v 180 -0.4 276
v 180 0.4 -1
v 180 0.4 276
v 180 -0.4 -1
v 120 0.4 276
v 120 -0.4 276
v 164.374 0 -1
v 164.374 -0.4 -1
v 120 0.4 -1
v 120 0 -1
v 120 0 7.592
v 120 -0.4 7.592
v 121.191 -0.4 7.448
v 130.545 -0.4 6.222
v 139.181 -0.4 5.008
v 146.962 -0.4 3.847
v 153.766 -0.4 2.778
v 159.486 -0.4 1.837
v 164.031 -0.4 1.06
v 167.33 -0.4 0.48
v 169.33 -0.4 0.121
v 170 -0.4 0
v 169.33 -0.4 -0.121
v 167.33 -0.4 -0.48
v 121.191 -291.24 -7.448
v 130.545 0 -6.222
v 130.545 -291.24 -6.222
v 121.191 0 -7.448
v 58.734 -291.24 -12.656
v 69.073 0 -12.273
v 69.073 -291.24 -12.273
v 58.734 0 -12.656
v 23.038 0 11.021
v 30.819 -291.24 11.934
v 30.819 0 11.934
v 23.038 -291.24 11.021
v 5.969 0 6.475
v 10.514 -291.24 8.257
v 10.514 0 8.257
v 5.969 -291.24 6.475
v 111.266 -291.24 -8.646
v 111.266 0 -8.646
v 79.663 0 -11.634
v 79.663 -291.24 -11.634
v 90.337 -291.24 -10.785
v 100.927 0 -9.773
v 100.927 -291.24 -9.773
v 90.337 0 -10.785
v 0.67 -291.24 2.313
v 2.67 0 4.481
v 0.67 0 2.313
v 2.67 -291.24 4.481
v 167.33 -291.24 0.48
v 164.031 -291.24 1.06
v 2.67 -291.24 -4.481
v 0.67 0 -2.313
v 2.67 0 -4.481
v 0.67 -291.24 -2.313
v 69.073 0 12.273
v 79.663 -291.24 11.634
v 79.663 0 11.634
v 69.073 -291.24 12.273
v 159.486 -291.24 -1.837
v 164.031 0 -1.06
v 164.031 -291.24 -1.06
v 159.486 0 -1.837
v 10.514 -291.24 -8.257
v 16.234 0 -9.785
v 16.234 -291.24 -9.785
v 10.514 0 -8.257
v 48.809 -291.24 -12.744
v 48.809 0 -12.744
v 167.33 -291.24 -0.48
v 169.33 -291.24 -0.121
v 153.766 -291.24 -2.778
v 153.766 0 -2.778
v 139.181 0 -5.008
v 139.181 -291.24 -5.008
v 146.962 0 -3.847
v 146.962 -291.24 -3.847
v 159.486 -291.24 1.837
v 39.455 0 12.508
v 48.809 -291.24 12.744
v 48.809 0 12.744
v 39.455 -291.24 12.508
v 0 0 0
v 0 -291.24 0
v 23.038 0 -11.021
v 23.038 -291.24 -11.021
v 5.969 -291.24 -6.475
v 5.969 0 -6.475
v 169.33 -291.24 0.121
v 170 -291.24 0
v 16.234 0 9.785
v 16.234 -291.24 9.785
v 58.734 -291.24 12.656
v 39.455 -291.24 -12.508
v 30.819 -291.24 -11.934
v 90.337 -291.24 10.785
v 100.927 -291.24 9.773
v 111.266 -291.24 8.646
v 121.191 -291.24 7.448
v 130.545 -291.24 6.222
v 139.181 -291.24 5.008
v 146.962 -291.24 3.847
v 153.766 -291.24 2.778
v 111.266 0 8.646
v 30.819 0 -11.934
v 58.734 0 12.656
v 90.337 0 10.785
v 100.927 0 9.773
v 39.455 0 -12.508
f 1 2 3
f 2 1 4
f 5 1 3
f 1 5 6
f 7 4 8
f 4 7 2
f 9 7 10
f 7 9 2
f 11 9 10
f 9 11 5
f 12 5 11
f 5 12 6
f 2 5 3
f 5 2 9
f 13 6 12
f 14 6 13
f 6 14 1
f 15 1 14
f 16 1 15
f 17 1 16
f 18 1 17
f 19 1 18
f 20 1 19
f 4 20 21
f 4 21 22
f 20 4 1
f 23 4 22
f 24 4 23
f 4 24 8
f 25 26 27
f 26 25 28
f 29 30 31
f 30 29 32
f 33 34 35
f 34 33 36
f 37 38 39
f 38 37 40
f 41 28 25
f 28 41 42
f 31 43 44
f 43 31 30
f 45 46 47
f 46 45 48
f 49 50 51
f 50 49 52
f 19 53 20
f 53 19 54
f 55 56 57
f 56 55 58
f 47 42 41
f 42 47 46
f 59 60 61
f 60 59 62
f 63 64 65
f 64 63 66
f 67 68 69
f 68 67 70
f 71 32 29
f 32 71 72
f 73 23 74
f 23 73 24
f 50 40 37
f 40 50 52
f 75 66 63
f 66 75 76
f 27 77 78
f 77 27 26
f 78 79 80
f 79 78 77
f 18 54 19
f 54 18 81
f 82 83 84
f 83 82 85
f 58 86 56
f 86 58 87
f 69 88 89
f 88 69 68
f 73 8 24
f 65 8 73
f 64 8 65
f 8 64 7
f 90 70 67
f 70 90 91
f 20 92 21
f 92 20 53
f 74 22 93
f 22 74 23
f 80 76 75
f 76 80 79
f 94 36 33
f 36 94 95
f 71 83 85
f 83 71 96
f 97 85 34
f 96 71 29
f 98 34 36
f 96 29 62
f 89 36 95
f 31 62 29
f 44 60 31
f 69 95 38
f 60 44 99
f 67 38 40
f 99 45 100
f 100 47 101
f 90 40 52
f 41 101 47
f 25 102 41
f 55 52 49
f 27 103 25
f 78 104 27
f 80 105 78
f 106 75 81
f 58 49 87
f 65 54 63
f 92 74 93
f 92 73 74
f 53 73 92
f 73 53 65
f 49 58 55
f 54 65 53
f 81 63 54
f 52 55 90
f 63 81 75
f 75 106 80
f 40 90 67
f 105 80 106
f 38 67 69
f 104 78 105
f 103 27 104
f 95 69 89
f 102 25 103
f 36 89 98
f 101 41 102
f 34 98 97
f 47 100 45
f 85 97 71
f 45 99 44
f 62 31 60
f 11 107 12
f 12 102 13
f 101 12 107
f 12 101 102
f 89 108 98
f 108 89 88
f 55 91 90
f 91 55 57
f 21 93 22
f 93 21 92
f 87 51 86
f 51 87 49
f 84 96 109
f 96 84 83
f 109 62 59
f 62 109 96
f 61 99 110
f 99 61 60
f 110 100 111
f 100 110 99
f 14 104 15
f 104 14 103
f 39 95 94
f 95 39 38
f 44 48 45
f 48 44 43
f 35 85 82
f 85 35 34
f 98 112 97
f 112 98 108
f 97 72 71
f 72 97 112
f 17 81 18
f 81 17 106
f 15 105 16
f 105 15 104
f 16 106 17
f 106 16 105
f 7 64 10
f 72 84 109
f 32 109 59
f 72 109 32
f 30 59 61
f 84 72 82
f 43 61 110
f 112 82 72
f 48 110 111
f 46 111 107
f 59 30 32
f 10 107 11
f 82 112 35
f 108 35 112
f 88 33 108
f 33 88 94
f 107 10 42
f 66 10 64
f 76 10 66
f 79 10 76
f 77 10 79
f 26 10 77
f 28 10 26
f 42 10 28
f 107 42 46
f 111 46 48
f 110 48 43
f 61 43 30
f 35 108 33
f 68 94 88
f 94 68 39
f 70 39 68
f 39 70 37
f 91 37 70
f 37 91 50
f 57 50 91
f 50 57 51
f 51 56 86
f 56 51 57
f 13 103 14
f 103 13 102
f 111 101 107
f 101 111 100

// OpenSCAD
// file: 888_1000.scad
/*
// Nastavení zobrazení
$vpr = [338, 0, 357];
$vpt = [180, 25, -18];
$vpd = 1280;
*/
//improving rendering speed.
draft = true;   // sets rendering quality to draft.
$fs = draft ? 5 : 0.5;
$fa = 10;

/*
TODO: 

Přední díl obsahuje převis ve směru vybrání pro držák motoru. (U horního zámku)
Otvory pro šrouby v předním dílu jsou oválné, protože nejsou kolmo k rovině modelu.


*/




//vnitřní kapka
module hollowing_skeleton(shell_thickness = hull_wall_thickness, draft = true)
{

    beta = 90 - trailing_edge_angle(naca = hull_airfoil_thickness); // calculate the angle of trailing edge
    trailing_wall= 1/(cos(beta)); //calculate lenght of wall cut relative to wall thickness 

    intersection(){
    resize([hull_drop_length - shell_thickness - trailing_wall* shell_thickness, (hull_drop_length*hull_airfoil_thickness/100) - 2*shell_thickness, (hull_drop_length*hull_airfoil_thickness/100) - 2*shell_thickness], auto=true)
            rotate ([0,90,0])           
            rotate_extrude($fn = draft ? 50 : 100)
                rotate([0,0,90])
                    difference()
                    {
                      polygon(points = airfoil_data(naca=hull_airfoil_thickness, L = hull_drop_length, N=draft ? 50 : 200)); 
                      square(hull_drop_length); 
                    }
                    
      translate([0,0,hull_corner_radius])
        minkowski(){                   
            translate ([0,- hull_y_size , - hull_z_size/2 + shell_thickness])
                cube ([hull_x_size,2*hull_y_size - shell_thickness, hull_z_size - 2*shell_thickness - 2*hull_corner_radius]);
                rotate ([0,90,0])
                    cylinder (h = 1, r = hull_corner_radius, $fn = draft ? 50 : 100);                   
          }
                            
    }
}

module hollowing_skeleton_hem(ribbon_width, draft)
{

    beta = 90 - trailing_edge_angle(naca = hull_airfoil_thickness); // calculate the angle of trailing edge
    trailing_wall= 1/(cos(beta)); //calculate lenght of wall cut relative to wall thickness 

    intersection () {
    resize([hull_drop_length - ribbon_width - trailing_wall* ribbon_width, (hull_drop_length*hull_airfoil_thickness/100) - 2*ribbon_width, (hull_drop_length*hull_airfoil_thickness/100) - 2*ribbon_width], auto=true)
            rotate ([0,90,0])           
            rotate_extrude($fn = draft ? 50 : 100)
                rotate([0,0,90])
                    difference()
                    {
                      polygon(points = airfoil_data(naca=hull_airfoil_thickness, L = hull_drop_length, N=draft ? 50 : 200)); 
                      square(hull_drop_length); 
                    }
                    
      translate([0,0,hull_corner_radius])
        minkowski(){                   
            translate ([0,- hull_y_size, - hull_z_size/2 + ribbon_width])
                cube ([hull_x_size,2*hull_y_size - ribbon_width, hull_z_size - 2*ribbon_width - 2*hull_corner_radius]);
                rotate ([0,90,0])
                    cylinder (h = 1, r = hull_corner_radius, $fn = draft ? 50 : 100);                   
          }
                            
    }
}




//celá kapka
module drop(draft = true)
{

    beta = 90 - trailing_edge_angle(naca = hull_airfoil_thickness); // calculate the angle of trailing edge
    trailing_wall= 1/(cos(beta)); //calculate lenght of wall cut relative to wall thickness 

	intersection () {
    	rotate ([0,90,0])           
        	rotate_extrude($fn = draft ? 50 : 100)
                    rotate([0,0,90])
                        difference()
                        {
	                        polygon(points = airfoil_data(naca=hull_airfoil_thickness, L =hull_drop_length , N=draft ? 50 : 200)); 
    	                    square(hull_drop_length); 
        	            }
            		
        translate([0,0,hull_corner_radius])
          	minkowski(){                   
             	translate ([0,-hull_y_size,-hull_z_size/2])
             			cube ([hull_x_size, 2*hull_y_size,hull_z_size-2*hull_corner_radius]);
             	  	rotate ([0,90,0])
                 		cylinder (h = 1, r = hull_corner_radius, $fn = draft ? 50 : 100);                   
		    }
		    
	}
}


//základní kapka
module drop_skin(draft = true){

	difference(){
		drop(draft);
		translate([hull_wall_thickness,0,0])
			hollowing_skeleton(hull_wall_thickness, draft);
	}

}




drop_skin();














use <./lib/naca4.scad>
include <../Parameters.scad>
// file: 666_1025.scad
/*
// Nastavení zobrazení
$vpr = [338, 0, 357];
$vpt = [180, 25, -18];
$vpd = 1280;
*/
//improving rendering speed.
draft = true;   // sets rendering quality to draft.
$fs = draft ? 5 : 0.5;
$fa = 10;

/*
TODO: 

Přední díl obsahuje převis ve směru vybrání pro držák motoru. (U horního zámku)
Otvory pro šrouby v předním dílu jsou oválné, protože nejsou kolmo k rovině modelu.


*/



module 666_1025(draft = true){

    beta = 90 - trailing_edge_angle(naca = hull_airfoil_thickness); // calculate the angle of trailing edge
    trailing_wall= 1/(cos(beta)); //calculate lenght of wall cut relative to wall thickness   


union(){

    difference(){
        union(){
            difference(){
                union(){
                    //základní kapka
                    intersection (){
                            drop_skin(draft);
                    translate([0,0,- hull_z_size/2])
                            cube([hull_drop_length, hull_y_size, hull_z_size]);
                    }
            
                    intersection(){
                    // 666_1032 part holder - limit the size to maximum printable size by intersection with cube
                    translate([cover_pilon_position,0,0]) 
                        rotate ([-90,0,0])
                            translate ([hull_wall_thickness,0,0])
                                resize([170 - hull_wall_thickness - trailing_wall*hull_wall_thickness - trailing_wall*global_clearance - global_clearance ,(170*0030/100) - 2*hull_wall_thickness - 2*global_clearance ,200], auto=true) 
                                    airfoil(naca = 0030, L = 170, N = draft ? 50 : 100, h = draft ? 50 : 100, open = false);

                    translate ([0,-(main_tube_outer_diameter/2)-hull_wall_thickness, -hull_z_size/2])
                            cube ([hull_x_size, hull_y_size,hull_z_size]);      
                    }
                }

            translate([hull_wall_thickness,0,0])
                    hollowing_skeleton(hull_wall_thickness, draft);
            }
        }

            //engine holder 
            translate ([-global_clearance,-1 - main_tube_outer_diameter/2 - hull_wall_thickness, - width_of_engine_holder/2])
                    cube ([ top_cover_division[1] + global_clearance, hull_y_size+10, width_of_engine_holder]);

            //for tube in back
            translate ([hull_x_size-70,0,0])
                rotate ([0,90,0])
                    cylinder (h = 80, r =  main_tube_outer_diameter/2, $fn = draft ? 20 : 50);
                            
            //for rotor pilon
            translate ([cover_pilon_position+2*hull_wall_thickness,-10,0])       
                rotate ([-90,0,0])
                    resize([170 - 2*hull_wall_thickness  - trailing_wall*hull_wall_thickness - trailing_wall*global_clearance  - global_clearance - trailing_wall*hull_wall_thickness ,(170*0030/100) - 2*hull_wall_thickness - 2*hull_wall_thickness - 2*global_clearance ,200], auto=true) 
                        airfoil(naca = 0030, L = 170, N = draft ? 50 : 100, h = 200, open = false);

            //šrouby
            //část A
                translate([(top_cover_division[0] + top_cover_division[1])/4, main_tube_outer_diameter/4, -hull_z_size/2])
                    rotate([0,45,0])
                        cylinder(h = 40, r = M3_screw_diameter/2, $fn = draft ? 10 : 20);

            mirror([0,0,1])
                translate([(top_cover_division[0] + top_cover_division[1])/4, main_tube_outer_diameter/4, -hull_z_size/2])
                    rotate([0,45,0])
                        cylinder(h = 40, r = M3_screw_diameter/2, $fn = draft ? 10 : 20);


            //část B
                translate([(top_cover_division[2] - top_cover_division[1])/2 + top_cover_division[1], main_tube_outer_diameter/4,-hull_z_size/2-25])
                        cylinder(h = hull_z_size+30, r = M3_screw_diameter/2, $fn = draft ? 10 : 20);

            
            //část C    
                translate([(top_cover_division[3] - top_cover_division[2])/2 + top_cover_division[2],main_tube_outer_diameter/4,-hull_z_size/2-25])
                        cylinder(h = hull_z_size+30, r = M3_screw_diameter/2, $fn = draft ? 10 : 20);


            //část D
                translate([(top_cover_division[4] - top_cover_division[3])/2 + top_cover_division[3],main_tube_outer_diameter/4,-55])
                    rotate([0,90+beta,0])   
                        cylinder(h = 50, r = M3_screw_diameter/2, $fn = draft ? 10 : 20);
                            
            mirror([0,0,1])
                translate([(top_cover_division[4] - top_cover_division[3])/2 + top_cover_division[3],main_tube_outer_diameter/4,-55])
                    rotate([0,90+beta,0])   
                       cylinder(h = 50, r = M3_screw_diameter/2, $fn = draft ? 10 : 20);

            //část E


                translate([(top_cover_division[5] - top_cover_division[4])/2 + top_cover_division[4] - 20,main_tube_outer_diameter/4,-15])
                    rotate([0,90+beta,0])
                        cylinder(h = 50, r = M3_screw_diameter/2, $fn = draft ? 10 : 20);

            mirror([0,0,1])
                translate([(top_cover_division[5] - top_cover_division[4])/2 + top_cover_division[4] - 20,main_tube_outer_diameter/4,-15])
                    rotate([0,90+beta,0])
                        cylinder(h = 50, r = M3_screw_diameter/2, $fn = draft ? 10 : 20);

            //nápis
            translate([hull_x_size/4 + 35, hull_y_size/4, hull_z_size/2 - hull_wall_thickness/5])
                linear_extrude(hull_wall_thickness) 
                    text("TF-G1", size = 30, halign = "center", valign = "center", font = "PT Sans");
        
            // boční text s identifikací

            translate([hull_x_size/4 + 35, hull_y_size/4, -hull_z_size/2 + hull_wall_thickness/5])
                rotate([0,180,0])
                    linear_extrude(hull_wall_thickness) 
                        text("TF-G1", size = 30, halign = "center", valign = "center", font = "PT Sans");

    //final difference
    }
            //lem
            union(){
                intersection(){
                    difference(){
                        translate([0,0,-hull_z_size/2])       
                            cube([hull_x_size, hull_wall_thickness, hull_z_size]);

                    //for front part
                        translate ([- global_clearance,-1 - main_tube_outer_diameter/2,- width_of_engine_holder/2])
                            cube([top_cover_division[1] + global_clearance,hull_y_size+10,width_of_engine_holder]);

                    //for tube in back
                        translate ([hull_x_size-70,-6,0])
                            cube([6*main_tube_outer_diameter, main_tube_outer_diameter, main_tube_outer_diameter], center = true);

                        translate ([hull_x_size-65,-16,16.5])
                            rotate([0,100,0])
                                cube([hull_wall_thickness*5,30,30]);

                        translate ([hull_x_size-65,-15,-12.5])
                            rotate([0,80,0])
                            cube([hull_wall_thickness*5,30,30]);

                        //odebrání dna
                        translate([ribbon_width/2,0,0])
                            hollowing_skeleton(ribbon_width, draft);
                    }       

                //odstranění dna z vnější strany krytu
                    drop(draft);
              }
           }

        intersection(){
            union(){

                //přední stěna Z+
                //čtverec
                translate([ 0,2*hull_wall_thickness, width_of_engine_holder/2 ])       
                    cube([top_cover_division[1], hull_y_size, hull_wall_thickness]);

                //přední stěna Z-
                //čtverec
                translate([ 0,2*hull_wall_thickness, - hull_wall_thickness - width_of_engine_holder/2])        
                    cube([top_cover_division[1], hull_y_size, hull_wall_thickness]);

                //pro rovnou horní hranu předního lemu
                translate([top_cover_division[1] - hull_wall_thickness, main_tube_outer_diameter, -width_of_engine_holder/2 - hull_wall_thickness])
                    cube([hull_wall_thickness, hull_y_size, width_of_engine_holder + 2* hull_wall_thickness]);

                // lem pro výztuhu a slepení dílu A    
                difference(){
                    union(){
                        translate([top_cover_division[1] - hull_wall_thickness, main_tube_outer_diameter/2 + coupling_wall_thickness + global_clearance, - hull_z_size])
                            cube([hull_wall_thickness, hull_y_size, hull_z_size*2]);

                        //pro lepení - čtverec 
                        difference(){
                            translate([top_cover_division[2] - hull_wall_thickness,main_tube_outer_diameter/2 + coupling_wall_thickness + global_clearance,-hull_z_size])
                                cube([hull_wall_thickness, hull_y_size, hull_z_size*2]);
                        //odečtení nápisu od příčné výztuhy
                        //nápis
                            translate([hull_x_size/4 + 35, hull_y_size/4, hull_z_size/2 - hull_wall_thickness/5])
                                linear_extrude(hull_wall_thickness) 
                                    text("TF-G1", size = 30, halign = "center", valign = "center", font = "PT Sans");
        
                        // boční text s identifikací
                            translate([hull_x_size/4 + 35, hull_y_size/4, -hull_z_size/2 + hull_wall_thickness/5])
                                rotate([0,180,0])
                                    linear_extrude(hull_wall_thickness) 
                                        text("TF-G1", size = 30, halign = "center", valign = "center", font = "PT Sans");
                        }

                        //pro lepení - čtverec 
                        translate([top_cover_division[3] - hull_wall_thickness,main_tube_outer_diameter/2 + coupling_wall_thickness + global_clearance,-hull_z_size])
                            cube([hull_wall_thickness, hull_y_size, hull_z_size*2]);

                        //pro lepení - čtverec 
                        translate([top_cover_division[3], main_tube_outer_diameter/2 + coupling_wall_thickness + global_clearance, -hull_z_size])
                            cube([hull_wall_thickness, hull_y_size, hull_z_size*2]);
                        //pro lepení - čtverec 
                        translate([top_cover_division[4], main_tube_outer_diameter/2 + coupling_wall_thickness + global_clearance, -hull_z_size])
                            cube([hull_wall_thickness, hull_y_size, hull_z_size*2]);

                        //podélná výztuha
                        difference(){
                            union(){
                            translate([top_cover_division[1],main_tube_outer_diameter/2 + 4*coupling_wall_thickness + global_clearance,-hull_z_size/2])      
                                cube([top_cover_division[4] - top_cover_division[1], hull_wall_thickness, hull_z_size]);
                            translate([top_cover_division[1],main_tube_outer_diameter/2 + 2*coupling_wall_thickness + global_clearance,-hull_z_size/2])      
                                cube([top_cover_division[4] - top_cover_division[1], hull_wall_thickness, hull_z_size]);
                            }
                        //odečtení nápisu od podélné výztuhy
                        //nápis
                            translate([hull_x_size/4 + 35, hull_y_size/4, hull_z_size/2 - hull_wall_thickness/5])
                                linear_extrude(hull_wall_thickness) 
                                    text("TF-G1", size = 30, halign = "center", valign = "center", font = "PT Sans");
        
                        // boční text s identifikací

                            translate([hull_x_size/4 + 35, hull_y_size/4, -hull_z_size/2 + hull_wall_thickness/5])
                                rotate([0,180,0])
                                    linear_extrude(hull_wall_thickness) 
                                        text("TF-G1", size = 30, halign = "center", valign = "center", font = "PT Sans");
                        }

                    }
            
                
                    //pro lepení - odstranění kusu z díry pro horní držák
                    translate ([180+2*hull_wall_thickness,-10,0])       
                        rotate ([-90,0,0])
                            resize([170 - 2*hull_wall_thickness  - trailing_wall*hull_wall_thickness - trailing_wall*global_clearance  - global_clearance - trailing_wall*hull_wall_thickness ,(170*0030/100) - 2*hull_wall_thickness - 2*hull_wall_thickness - 2*global_clearance ,200], auto=true) 
                                airfoil(naca = 0030, L = 170, N = draft ? 50 : 100, h = 200, open = false);

                    translate([ribbon_width/2,0,0])
                        hollowing_skeleton(ribbon_width, draft);
                }       
                
            }     
            //odstranění přesahů z vnější strany
            drop(draft);
        }

//final union   

}
    

//konec model celek
}

module 666_1025_part(part_number, draft){ 

    beta = 90 - trailing_edge_angle(naca = hull_airfoil_thickness); // calculate the angle of trailing edge
    trailing_wall= 1/(cos(beta)); //calculate lenght of wall cut relative to wall thickness

    division_position = top_cover_division[part_number];
    previous_division = top_cover_division[part_number - 1];

    part_lenght = division_position - previous_division;
    lock_width = 10;
    part_flip = 4;  // část od které se otáčí pořadí zámků.

    if (part_number < part_flip) {
        difference(){
            union(){    
                //základní dělení pro tisk
                intersection(){
                    666_1025(draft);
                    translate([previous_division + global_clearance/2,-20,-75])                        
                        cube([part_lenght - global_clearance/2, 150, 150]);
                }
                
                //zámky přidané 
                union(){
                    intersection(){
                        drop_skin(draft);   
                        union(){
                            //čtverec pro zámek horní
                            translate([previous_division - 2*hull_wall_thickness, main_tube_outer_diameter, -lock_width/2])
                                    cube([hull_wall_thickness*3, hull_y_size, lock_width]);
                            //čtverec pro zámek Z+
                            translate([previous_division - 2*hull_wall_thickness, main_tube_outer_diameter/2 + coupling_wall_thickness + 3*hull_wall_thickness, main_tube_outer_diameter ])
                                    cube([hull_wall_thickness*3, lock_width, hull_z_size]);
                            //čtverec pro zámek Z-
                            translate([previous_division - 2*hull_wall_thickness, main_tube_outer_diameter/2 + coupling_wall_thickness + 3*hull_wall_thickness, - hull_z_size - main_tube_outer_diameter])
                                    cube([hull_wall_thickness*3, lock_width, hull_z_size]);
                        //union
                        }   
                    //intersection
                    }
                //union zámky
                }   

            //final union
            }

            //zámky odečtení
            if (part_number != (part_flip-1)){   // na společném lemu pro prostřední díl se otvory na zámky vynechávají.                
                union(){
                    intersection(){
                        drop_skin(draft);   
                        union(){
                            //čtverec pro zámek horní
                            translate([division_position - 2*hull_wall_thickness, main_tube_outer_diameter, -lock_width/2 - global_clearance/2])
                                cube([hull_wall_thickness*4 + global_clearance, hull_y_size, lock_width + global_clearance]);
                            //čtverec pro zámek Z+
                            translate([division_position - 2*hull_wall_thickness,main_tube_outer_diameter/2 + coupling_wall_thickness - global_clearance/2 + 3*hull_wall_thickness,hull_z_size/2 - main_tube_outer_diameter])
                                cube([hull_wall_thickness*4 + global_clearance, lock_width + global_clearance, hull_z_size]);
                            //čtverec pro zámek Z-
                            translate([division_position - 2*hull_wall_thickness,main_tube_outer_diameter/2 + coupling_wall_thickness - global_clearance/2 + 3*hull_wall_thickness,- hull_z_size - main_tube_outer_diameter ])
                                cube([hull_wall_thickness*4 + global_clearance, lock_width + global_clearance, hull_z_size]);
                        //union
                        }   
                    //intersection
                    }
                //union zámky vlevo
                }
            }
            
        //final difference
        }
    }
    else{       // pokud jde o díl až za prostředním dělením.

        difference(){
            union(){    
                //základní dělení pro tisk
                intersection(){
                    666_1025(draft);
                    translate([previous_division,-20,-75])                        
                        cube([part_lenght - global_clearance/2, 150, 150]);
                }
                
                //zámky přidané 
                union(){
                    intersection(){
                        drop_skin(draft);   
                        union(){
                            //čtverec pro zámek horní
                            translate([division_position - 2*hull_wall_thickness, main_tube_outer_diameter, - lock_width/2])
                                    cube([hull_wall_thickness*4, hull_y_size, lock_width]);
                            //čtverec pro zámek Z+
                            translate([division_position - 2*hull_wall_thickness, main_tube_outer_diameter/2 + coupling_wall_thickness + 3*hull_wall_thickness, main_tube_outer_diameter])
                                    cube([hull_wall_thickness*4, lock_width, hull_z_size]);
                            //čtverec pro zámek Z-
                            translate([division_position - 2*hull_wall_thickness, main_tube_outer_diameter/2 + coupling_wall_thickness + 3*hull_wall_thickness, -main_tube_outer_diameter - hull_z_size ])
                                    cube([hull_wall_thickness*4, lock_width, hull_z_size]);
                        //union
                        }   
                    //intersection
                    }
                //union zámky
                }   
            //final union
            }

            if (part_number != part_flip){   // na společném lemu pro prostřední díl se otvory na zámky vynechávají.                
                //zámky odečtení
                union(){
                    intersection(){
                        drop_skin(draft);   
                        union(){
                            //čtverec pro zámek horní
                            translate([previous_division - 2*hull_wall_thickness, main_tube_outer_diameter/2, -lock_width/2 - global_clearance/2])
                                cube([hull_wall_thickness*4 + global_clearance, hull_y_size, lock_width + global_clearance]);
                            //čtverec pro zámek Z+
                            translate([previous_division - 2*hull_wall_thickness,main_tube_outer_diameter/2 + coupling_wall_thickness - global_clearance/2 + 3*hull_wall_thickness, main_tube_outer_diameter])
                                cube([hull_wall_thickness*4 + global_clearance, lock_width + global_clearance, hull_z_size]);
                            //čtverec pro zámek Z-
                            translate([previous_division - 2*hull_wall_thickness,main_tube_outer_diameter/2 + coupling_wall_thickness - global_clearance/2 + 3*hull_wall_thickness, - main_tube_outer_diameter - hull_z_size])
                                cube([hull_wall_thickness*4 + global_clearance, lock_width + global_clearance, hull_z_size]);
                        //union
                        }   
                    //intersection
                    }
                //union zámky vlevo
                }
            }
        //final difference
        }

    }

//final module
}   






/*
666_1025_part(1, draft);

translate([10,0,0])
666_1025_part(2, false);

translate([20,0,0])
666_1025_part(3, draft);

translate([30,0,0])
666_1025_part(4, draft);

translate([40,0,0])
666_1025_part(5, draft);


*/
666_1025(draft);


use <888_1000.scad>

use <./lib/naca4.scad>
include <../Parameters.scad>
// file: ../Parameters.scad
//Main tube diameter - hole [mm]
main_tube_outer_diameter = 25.4;
main_tube_inner_diameter = 23.5;

//Tube for undercarriage - hole [mm]
tube_for_undercarriage_outer_diameter = 10.6;
tube_for_undercarriage_inner_diameter = 6;
global_clearance = 0.5;


//umístění podvozkových trubek

second_undercarriage_hole = main_tube_outer_diameter*2 + main_tube_outer_diameter/5 + main_tube_outer_diameter/2 + 170 + 160;

// Parameters of cube couplings
coupling_wall_thickness = main_tube_outer_diameter/5;  //width of coupling walls 
thickness_between_tubes = main_tube_outer_diameter/10;    // minimum distance between tubes in couplings

coupling_wall_thickness_undercarriage = tube_for_undercarriage_outer_diameter/3;
thickness_between_tubes_undercarriage = tube_for_undercarriage_outer_diameter/10;

//Screw diameter and nut for M4 [mm]
M4_screw_diameter=4.5;
Nut_height_M4 = 3.2;
Nut_diameter_M4 = 7.86;


//Screw diameter and nut for M3 [mm]
M3_screw_diameter = 3.2;
Nut_height_M3 = 1.7;	
Nut_diameter_M3 = 6.6; 


//The tube for help
Help_main_tube_outer = 25;
Help_main_tube_inner = 23; 
Help_tube_for_undercarriage_outer = 10;
Help_tube_for_undercarriage_inner = 5;


//main hull parameters

hull_drop_length = 580;
hull_wall_thickness = 0.8;
hull_y_size = 120;
hull_z_size = 150;
hull_x_size = 580;
hull_corner_radius = 4;
hull_airfoil_thickness= 35;  // thickness of drop generating airfoil in percent of lenght.
hull_scale_x = 1;
hull_scale_y = 1.5;
hull_scale_z = 1.5;

main_pilon_position = 170+68;
cover_pilon_position = 180;
height_of_vertical_tube = 275; //278mm je změřená délka trubky. 

ribbon_width = 5; // šířka vyztužovacích lemů. 

// šířka otvoru v přední části kapoty pro držák motoru.
width_of_engine_holder = 63;

//Top Cover Division - dělení horního krytu pro tisk
top_cover_division = [0, 50, 150, 280, 410, hull_x_size]; // upraveny seznam tak, aby deleni začinalo od nuly, což umožňí úplně automatické rozdělení.

//Bottom Cover Division - dělení dolního krytu pro tisk
bottom_cover_division = [0,100,250,365, 470, hull_x_size];
// zkrácená část pro payload pro testovací tisk
//bottom_cover_division = [0,200,250,365, 470, hull_x_size];

//Base Divison - dělení podložky
base_division = [0,140,280,410, hull_x_size];

//Cover pilon division - na výšku (v ose Z)
cover_pilon_division = [0,170,height_of_vertical_tube + main_tube_outer_diameter + coupling_wall_thickness];

//pozice šroubů
	//horní kryt
top_screw_position = [0, (top_cover_division[0] + top_cover_division[1])/4, (top_cover_division[2] - top_cover_division[1])/2 + top_cover_division[1], (top_cover_division[3] - top_cover_division[2])/2 + top_cover_division[2],(top_cover_division[4] - top_cover_division[3])/2 + top_cover_division[3],(top_cover_division[5] - top_cover_division[4])/2 + top_cover_division[4] - 20];
	//spodní kryt
bottom_screw_position = [(bottom_cover_division[0] + bottom_cover_division[1])/15 + 5, bottom_cover_division[1]/1.1 + bottom_cover_division[3], bottom_cover_division[3] + bottom_cover_division[1]/2, bottom_cover_division[4], bottom_cover_division[4] + bottom_cover_division[1]/2];




//šířka zámků
lock_width = 10;

//délka zámků
lock_length = 3;


//accumulator
//základní rozměry akumulátoru
width_of_accumulator = 129.4;//45+1;
depth_of_accumulator = 40.61;
height_of_accumulator = 43.65;
//Zapuštění akumulátoru
sink_of_accumulator = 5; //main_tube_outer_diameter/5 - Nut_height_M3*1.5;

//tloušťka hrany spojky
accumulator_holder_width = 18; 
accumulator_holder_thickness = 10; 

//posunutí akumálátoru na podložce
move_of_accumulator = 165;   // pozice akumulátoru (ovlivňuje těžiště)


////////////////
// Senzory
///////////////////

//opticalFlow
    width_optical_flow_senzor = 45.5;
    depth_optical_flow_senzor = 6;
    height_optical_flow_senzor = 35;
    sink_of_optical_flow_senzor = depth_optical_flow_senzor - 5; 
    M3_optical_flow_senzor_Z = 30.4;
    M3_optical_flow_senzor_X = 24;
    M3_optical_flow_senzor_Z_alone = 9.1;
    M3_optical_flow_senzor_X_alone = 16.7;
// file: lib/naca4.scad
// Naca4.scad - library for parametric airfoils of 4 digit NACA series
// Code: Rudolf Huttary, Berlin 
// June 2015
// commercial use prohibited


// general use: for more examples refer to sampler.scad
// naca = naca digits or 3el vector  (default = 12 or [0, 0, .12])
// L    = chord length [mm]      (default= 100)
// N    = # sample points        (default= 81)
// h    = height [mm]            (default= 1)
// open = close at the thin end? (default = true)
// two equivalent example calls
 airfoil(naca = 2408, L = 60, N=1001, h = 30, open = false); 
// airfoil(naca = [.2, .4, .32], L = 60, N=1001, h = 30, open = false); 

module help()
{
  echo(str("\n\nList of signatures in lib:\n=================\n", 
  "module airfoil(naca=2412, L = 100, N = 81, h = 1, open = false) - renders airfoil object\n", 
  "module airfoil(naca=[.2, .4, .12], L = 100, N = 81, h = 1, open = false) - renders airfoil object using percentage for camber,  camber distance and thicknes\n", 
  "function airfoil_data(naca=12, L = 100, N = 81, open = false)\n",
  "=================\n")); 
}

help(); 
// this is the object
module airfoil(naca=12, L = 100, N = 81, h = 1, open = false)
{
  linear_extrude(height = h)
  polygon(points = airfoil_data(naca, L, N, open)); 
}

// this is the main function providing the airfoil data
function airfoil_data(naca=12, L = 100, N = 81, open = false) = 
  let(Na = len(naca)!=3?NACA(naca):naca)
  let(A = [.2969, -0.126, -.3516, .2843, open?-0.1015:-0.1036])
  [for (b=[-180:360/(N):179.99]) 
    let (x = (1-cos(b))/2)  
    let(yt = sign(b)*Na[2]/.2*(A*[sqrt(x), x, x*x, x*x*x, x*x*x*x])) 
    Na[0]==0?L*[x, yt]:L*camber(x, yt, Na[0], Na[1], sign(b))];  


function trailing_edge_angle(naca=12, open = false) = 
  let(Na = len(naca)!=3?NACA(naca):naca)
  let(A = [.2969, -0.126, -.3516, .2843, open?-0.1015:-0.1036])
  let (x =0.999)  // set x near to airfoil trailing edge
  let(yt = Na[2]/.2*(A*[sqrt(x), x, x*x, x*x*x, x*x*x*x])) // calculate distance from x-axis at previously set position
  atan2(yt,1-x);  // calculate angle of triangle between end of airfoil. The triange height corresponds to previously calculated distance from x-axis

// helper functions
function NACA(naca) = 
  let (M = floor(naca/1000))
  let (P = floor((naca-M*1000)/100)) 
  [M/100, P/10, floor(naca-M*1000-P*100)/100];  

function camber(x, y, M, P, upper) = 
  let(yc = (x<P)?M/P/P*(2*P*x-x*x): M/(1-P)/(1-P)*(1 - 2*P + 2*P*x -x*x))
  let(dy = (x<P)?2*M/P/P*(P-x):2*M/(1-P)/(1-P)*(P-x))
  let(th = atan(dy))
  [upper ? x - y*sin(th):x + y*sin(th), upper ? yc + y*cos(th):yc - y*cos(th)];
// main file
draft = true;   // sets rendering quality to draft.
$fs = draft ? 5 : 0.5;
$fa = 10;

module 333_1037(draft){

    airfoil_thickness = 0015;
    airfoil_depth = main_tube_outer_diameter*2;
    lenght = 970;


    difference (){
        %cube ([970,70,3.86*2], center = true);

    	translate ([120,- hull_wall_thickness/2,- 2*global_clearance])
            cube ([60,hull_wall_thickness,height_of_vertical_tube + 4*global_clearance]);
    }

    //translate ([120,- hull_wall_thickness/2,- 2*global_clearance])
    rotate([90,0,0])
        airfoil(naca = airfoil_thickness, L = 170, N = draft ? 50 : 100, h = height_of_vertical_tube + main_tube_outer_diameter/2 + 2*global_clearance + thickness_between_tubes, open = false);

}



333_1037(draft);

use <./lib/naca4.scad>
include <../Parameters.scad>
use <666_1025.scad>
use <888_1000.scad>
